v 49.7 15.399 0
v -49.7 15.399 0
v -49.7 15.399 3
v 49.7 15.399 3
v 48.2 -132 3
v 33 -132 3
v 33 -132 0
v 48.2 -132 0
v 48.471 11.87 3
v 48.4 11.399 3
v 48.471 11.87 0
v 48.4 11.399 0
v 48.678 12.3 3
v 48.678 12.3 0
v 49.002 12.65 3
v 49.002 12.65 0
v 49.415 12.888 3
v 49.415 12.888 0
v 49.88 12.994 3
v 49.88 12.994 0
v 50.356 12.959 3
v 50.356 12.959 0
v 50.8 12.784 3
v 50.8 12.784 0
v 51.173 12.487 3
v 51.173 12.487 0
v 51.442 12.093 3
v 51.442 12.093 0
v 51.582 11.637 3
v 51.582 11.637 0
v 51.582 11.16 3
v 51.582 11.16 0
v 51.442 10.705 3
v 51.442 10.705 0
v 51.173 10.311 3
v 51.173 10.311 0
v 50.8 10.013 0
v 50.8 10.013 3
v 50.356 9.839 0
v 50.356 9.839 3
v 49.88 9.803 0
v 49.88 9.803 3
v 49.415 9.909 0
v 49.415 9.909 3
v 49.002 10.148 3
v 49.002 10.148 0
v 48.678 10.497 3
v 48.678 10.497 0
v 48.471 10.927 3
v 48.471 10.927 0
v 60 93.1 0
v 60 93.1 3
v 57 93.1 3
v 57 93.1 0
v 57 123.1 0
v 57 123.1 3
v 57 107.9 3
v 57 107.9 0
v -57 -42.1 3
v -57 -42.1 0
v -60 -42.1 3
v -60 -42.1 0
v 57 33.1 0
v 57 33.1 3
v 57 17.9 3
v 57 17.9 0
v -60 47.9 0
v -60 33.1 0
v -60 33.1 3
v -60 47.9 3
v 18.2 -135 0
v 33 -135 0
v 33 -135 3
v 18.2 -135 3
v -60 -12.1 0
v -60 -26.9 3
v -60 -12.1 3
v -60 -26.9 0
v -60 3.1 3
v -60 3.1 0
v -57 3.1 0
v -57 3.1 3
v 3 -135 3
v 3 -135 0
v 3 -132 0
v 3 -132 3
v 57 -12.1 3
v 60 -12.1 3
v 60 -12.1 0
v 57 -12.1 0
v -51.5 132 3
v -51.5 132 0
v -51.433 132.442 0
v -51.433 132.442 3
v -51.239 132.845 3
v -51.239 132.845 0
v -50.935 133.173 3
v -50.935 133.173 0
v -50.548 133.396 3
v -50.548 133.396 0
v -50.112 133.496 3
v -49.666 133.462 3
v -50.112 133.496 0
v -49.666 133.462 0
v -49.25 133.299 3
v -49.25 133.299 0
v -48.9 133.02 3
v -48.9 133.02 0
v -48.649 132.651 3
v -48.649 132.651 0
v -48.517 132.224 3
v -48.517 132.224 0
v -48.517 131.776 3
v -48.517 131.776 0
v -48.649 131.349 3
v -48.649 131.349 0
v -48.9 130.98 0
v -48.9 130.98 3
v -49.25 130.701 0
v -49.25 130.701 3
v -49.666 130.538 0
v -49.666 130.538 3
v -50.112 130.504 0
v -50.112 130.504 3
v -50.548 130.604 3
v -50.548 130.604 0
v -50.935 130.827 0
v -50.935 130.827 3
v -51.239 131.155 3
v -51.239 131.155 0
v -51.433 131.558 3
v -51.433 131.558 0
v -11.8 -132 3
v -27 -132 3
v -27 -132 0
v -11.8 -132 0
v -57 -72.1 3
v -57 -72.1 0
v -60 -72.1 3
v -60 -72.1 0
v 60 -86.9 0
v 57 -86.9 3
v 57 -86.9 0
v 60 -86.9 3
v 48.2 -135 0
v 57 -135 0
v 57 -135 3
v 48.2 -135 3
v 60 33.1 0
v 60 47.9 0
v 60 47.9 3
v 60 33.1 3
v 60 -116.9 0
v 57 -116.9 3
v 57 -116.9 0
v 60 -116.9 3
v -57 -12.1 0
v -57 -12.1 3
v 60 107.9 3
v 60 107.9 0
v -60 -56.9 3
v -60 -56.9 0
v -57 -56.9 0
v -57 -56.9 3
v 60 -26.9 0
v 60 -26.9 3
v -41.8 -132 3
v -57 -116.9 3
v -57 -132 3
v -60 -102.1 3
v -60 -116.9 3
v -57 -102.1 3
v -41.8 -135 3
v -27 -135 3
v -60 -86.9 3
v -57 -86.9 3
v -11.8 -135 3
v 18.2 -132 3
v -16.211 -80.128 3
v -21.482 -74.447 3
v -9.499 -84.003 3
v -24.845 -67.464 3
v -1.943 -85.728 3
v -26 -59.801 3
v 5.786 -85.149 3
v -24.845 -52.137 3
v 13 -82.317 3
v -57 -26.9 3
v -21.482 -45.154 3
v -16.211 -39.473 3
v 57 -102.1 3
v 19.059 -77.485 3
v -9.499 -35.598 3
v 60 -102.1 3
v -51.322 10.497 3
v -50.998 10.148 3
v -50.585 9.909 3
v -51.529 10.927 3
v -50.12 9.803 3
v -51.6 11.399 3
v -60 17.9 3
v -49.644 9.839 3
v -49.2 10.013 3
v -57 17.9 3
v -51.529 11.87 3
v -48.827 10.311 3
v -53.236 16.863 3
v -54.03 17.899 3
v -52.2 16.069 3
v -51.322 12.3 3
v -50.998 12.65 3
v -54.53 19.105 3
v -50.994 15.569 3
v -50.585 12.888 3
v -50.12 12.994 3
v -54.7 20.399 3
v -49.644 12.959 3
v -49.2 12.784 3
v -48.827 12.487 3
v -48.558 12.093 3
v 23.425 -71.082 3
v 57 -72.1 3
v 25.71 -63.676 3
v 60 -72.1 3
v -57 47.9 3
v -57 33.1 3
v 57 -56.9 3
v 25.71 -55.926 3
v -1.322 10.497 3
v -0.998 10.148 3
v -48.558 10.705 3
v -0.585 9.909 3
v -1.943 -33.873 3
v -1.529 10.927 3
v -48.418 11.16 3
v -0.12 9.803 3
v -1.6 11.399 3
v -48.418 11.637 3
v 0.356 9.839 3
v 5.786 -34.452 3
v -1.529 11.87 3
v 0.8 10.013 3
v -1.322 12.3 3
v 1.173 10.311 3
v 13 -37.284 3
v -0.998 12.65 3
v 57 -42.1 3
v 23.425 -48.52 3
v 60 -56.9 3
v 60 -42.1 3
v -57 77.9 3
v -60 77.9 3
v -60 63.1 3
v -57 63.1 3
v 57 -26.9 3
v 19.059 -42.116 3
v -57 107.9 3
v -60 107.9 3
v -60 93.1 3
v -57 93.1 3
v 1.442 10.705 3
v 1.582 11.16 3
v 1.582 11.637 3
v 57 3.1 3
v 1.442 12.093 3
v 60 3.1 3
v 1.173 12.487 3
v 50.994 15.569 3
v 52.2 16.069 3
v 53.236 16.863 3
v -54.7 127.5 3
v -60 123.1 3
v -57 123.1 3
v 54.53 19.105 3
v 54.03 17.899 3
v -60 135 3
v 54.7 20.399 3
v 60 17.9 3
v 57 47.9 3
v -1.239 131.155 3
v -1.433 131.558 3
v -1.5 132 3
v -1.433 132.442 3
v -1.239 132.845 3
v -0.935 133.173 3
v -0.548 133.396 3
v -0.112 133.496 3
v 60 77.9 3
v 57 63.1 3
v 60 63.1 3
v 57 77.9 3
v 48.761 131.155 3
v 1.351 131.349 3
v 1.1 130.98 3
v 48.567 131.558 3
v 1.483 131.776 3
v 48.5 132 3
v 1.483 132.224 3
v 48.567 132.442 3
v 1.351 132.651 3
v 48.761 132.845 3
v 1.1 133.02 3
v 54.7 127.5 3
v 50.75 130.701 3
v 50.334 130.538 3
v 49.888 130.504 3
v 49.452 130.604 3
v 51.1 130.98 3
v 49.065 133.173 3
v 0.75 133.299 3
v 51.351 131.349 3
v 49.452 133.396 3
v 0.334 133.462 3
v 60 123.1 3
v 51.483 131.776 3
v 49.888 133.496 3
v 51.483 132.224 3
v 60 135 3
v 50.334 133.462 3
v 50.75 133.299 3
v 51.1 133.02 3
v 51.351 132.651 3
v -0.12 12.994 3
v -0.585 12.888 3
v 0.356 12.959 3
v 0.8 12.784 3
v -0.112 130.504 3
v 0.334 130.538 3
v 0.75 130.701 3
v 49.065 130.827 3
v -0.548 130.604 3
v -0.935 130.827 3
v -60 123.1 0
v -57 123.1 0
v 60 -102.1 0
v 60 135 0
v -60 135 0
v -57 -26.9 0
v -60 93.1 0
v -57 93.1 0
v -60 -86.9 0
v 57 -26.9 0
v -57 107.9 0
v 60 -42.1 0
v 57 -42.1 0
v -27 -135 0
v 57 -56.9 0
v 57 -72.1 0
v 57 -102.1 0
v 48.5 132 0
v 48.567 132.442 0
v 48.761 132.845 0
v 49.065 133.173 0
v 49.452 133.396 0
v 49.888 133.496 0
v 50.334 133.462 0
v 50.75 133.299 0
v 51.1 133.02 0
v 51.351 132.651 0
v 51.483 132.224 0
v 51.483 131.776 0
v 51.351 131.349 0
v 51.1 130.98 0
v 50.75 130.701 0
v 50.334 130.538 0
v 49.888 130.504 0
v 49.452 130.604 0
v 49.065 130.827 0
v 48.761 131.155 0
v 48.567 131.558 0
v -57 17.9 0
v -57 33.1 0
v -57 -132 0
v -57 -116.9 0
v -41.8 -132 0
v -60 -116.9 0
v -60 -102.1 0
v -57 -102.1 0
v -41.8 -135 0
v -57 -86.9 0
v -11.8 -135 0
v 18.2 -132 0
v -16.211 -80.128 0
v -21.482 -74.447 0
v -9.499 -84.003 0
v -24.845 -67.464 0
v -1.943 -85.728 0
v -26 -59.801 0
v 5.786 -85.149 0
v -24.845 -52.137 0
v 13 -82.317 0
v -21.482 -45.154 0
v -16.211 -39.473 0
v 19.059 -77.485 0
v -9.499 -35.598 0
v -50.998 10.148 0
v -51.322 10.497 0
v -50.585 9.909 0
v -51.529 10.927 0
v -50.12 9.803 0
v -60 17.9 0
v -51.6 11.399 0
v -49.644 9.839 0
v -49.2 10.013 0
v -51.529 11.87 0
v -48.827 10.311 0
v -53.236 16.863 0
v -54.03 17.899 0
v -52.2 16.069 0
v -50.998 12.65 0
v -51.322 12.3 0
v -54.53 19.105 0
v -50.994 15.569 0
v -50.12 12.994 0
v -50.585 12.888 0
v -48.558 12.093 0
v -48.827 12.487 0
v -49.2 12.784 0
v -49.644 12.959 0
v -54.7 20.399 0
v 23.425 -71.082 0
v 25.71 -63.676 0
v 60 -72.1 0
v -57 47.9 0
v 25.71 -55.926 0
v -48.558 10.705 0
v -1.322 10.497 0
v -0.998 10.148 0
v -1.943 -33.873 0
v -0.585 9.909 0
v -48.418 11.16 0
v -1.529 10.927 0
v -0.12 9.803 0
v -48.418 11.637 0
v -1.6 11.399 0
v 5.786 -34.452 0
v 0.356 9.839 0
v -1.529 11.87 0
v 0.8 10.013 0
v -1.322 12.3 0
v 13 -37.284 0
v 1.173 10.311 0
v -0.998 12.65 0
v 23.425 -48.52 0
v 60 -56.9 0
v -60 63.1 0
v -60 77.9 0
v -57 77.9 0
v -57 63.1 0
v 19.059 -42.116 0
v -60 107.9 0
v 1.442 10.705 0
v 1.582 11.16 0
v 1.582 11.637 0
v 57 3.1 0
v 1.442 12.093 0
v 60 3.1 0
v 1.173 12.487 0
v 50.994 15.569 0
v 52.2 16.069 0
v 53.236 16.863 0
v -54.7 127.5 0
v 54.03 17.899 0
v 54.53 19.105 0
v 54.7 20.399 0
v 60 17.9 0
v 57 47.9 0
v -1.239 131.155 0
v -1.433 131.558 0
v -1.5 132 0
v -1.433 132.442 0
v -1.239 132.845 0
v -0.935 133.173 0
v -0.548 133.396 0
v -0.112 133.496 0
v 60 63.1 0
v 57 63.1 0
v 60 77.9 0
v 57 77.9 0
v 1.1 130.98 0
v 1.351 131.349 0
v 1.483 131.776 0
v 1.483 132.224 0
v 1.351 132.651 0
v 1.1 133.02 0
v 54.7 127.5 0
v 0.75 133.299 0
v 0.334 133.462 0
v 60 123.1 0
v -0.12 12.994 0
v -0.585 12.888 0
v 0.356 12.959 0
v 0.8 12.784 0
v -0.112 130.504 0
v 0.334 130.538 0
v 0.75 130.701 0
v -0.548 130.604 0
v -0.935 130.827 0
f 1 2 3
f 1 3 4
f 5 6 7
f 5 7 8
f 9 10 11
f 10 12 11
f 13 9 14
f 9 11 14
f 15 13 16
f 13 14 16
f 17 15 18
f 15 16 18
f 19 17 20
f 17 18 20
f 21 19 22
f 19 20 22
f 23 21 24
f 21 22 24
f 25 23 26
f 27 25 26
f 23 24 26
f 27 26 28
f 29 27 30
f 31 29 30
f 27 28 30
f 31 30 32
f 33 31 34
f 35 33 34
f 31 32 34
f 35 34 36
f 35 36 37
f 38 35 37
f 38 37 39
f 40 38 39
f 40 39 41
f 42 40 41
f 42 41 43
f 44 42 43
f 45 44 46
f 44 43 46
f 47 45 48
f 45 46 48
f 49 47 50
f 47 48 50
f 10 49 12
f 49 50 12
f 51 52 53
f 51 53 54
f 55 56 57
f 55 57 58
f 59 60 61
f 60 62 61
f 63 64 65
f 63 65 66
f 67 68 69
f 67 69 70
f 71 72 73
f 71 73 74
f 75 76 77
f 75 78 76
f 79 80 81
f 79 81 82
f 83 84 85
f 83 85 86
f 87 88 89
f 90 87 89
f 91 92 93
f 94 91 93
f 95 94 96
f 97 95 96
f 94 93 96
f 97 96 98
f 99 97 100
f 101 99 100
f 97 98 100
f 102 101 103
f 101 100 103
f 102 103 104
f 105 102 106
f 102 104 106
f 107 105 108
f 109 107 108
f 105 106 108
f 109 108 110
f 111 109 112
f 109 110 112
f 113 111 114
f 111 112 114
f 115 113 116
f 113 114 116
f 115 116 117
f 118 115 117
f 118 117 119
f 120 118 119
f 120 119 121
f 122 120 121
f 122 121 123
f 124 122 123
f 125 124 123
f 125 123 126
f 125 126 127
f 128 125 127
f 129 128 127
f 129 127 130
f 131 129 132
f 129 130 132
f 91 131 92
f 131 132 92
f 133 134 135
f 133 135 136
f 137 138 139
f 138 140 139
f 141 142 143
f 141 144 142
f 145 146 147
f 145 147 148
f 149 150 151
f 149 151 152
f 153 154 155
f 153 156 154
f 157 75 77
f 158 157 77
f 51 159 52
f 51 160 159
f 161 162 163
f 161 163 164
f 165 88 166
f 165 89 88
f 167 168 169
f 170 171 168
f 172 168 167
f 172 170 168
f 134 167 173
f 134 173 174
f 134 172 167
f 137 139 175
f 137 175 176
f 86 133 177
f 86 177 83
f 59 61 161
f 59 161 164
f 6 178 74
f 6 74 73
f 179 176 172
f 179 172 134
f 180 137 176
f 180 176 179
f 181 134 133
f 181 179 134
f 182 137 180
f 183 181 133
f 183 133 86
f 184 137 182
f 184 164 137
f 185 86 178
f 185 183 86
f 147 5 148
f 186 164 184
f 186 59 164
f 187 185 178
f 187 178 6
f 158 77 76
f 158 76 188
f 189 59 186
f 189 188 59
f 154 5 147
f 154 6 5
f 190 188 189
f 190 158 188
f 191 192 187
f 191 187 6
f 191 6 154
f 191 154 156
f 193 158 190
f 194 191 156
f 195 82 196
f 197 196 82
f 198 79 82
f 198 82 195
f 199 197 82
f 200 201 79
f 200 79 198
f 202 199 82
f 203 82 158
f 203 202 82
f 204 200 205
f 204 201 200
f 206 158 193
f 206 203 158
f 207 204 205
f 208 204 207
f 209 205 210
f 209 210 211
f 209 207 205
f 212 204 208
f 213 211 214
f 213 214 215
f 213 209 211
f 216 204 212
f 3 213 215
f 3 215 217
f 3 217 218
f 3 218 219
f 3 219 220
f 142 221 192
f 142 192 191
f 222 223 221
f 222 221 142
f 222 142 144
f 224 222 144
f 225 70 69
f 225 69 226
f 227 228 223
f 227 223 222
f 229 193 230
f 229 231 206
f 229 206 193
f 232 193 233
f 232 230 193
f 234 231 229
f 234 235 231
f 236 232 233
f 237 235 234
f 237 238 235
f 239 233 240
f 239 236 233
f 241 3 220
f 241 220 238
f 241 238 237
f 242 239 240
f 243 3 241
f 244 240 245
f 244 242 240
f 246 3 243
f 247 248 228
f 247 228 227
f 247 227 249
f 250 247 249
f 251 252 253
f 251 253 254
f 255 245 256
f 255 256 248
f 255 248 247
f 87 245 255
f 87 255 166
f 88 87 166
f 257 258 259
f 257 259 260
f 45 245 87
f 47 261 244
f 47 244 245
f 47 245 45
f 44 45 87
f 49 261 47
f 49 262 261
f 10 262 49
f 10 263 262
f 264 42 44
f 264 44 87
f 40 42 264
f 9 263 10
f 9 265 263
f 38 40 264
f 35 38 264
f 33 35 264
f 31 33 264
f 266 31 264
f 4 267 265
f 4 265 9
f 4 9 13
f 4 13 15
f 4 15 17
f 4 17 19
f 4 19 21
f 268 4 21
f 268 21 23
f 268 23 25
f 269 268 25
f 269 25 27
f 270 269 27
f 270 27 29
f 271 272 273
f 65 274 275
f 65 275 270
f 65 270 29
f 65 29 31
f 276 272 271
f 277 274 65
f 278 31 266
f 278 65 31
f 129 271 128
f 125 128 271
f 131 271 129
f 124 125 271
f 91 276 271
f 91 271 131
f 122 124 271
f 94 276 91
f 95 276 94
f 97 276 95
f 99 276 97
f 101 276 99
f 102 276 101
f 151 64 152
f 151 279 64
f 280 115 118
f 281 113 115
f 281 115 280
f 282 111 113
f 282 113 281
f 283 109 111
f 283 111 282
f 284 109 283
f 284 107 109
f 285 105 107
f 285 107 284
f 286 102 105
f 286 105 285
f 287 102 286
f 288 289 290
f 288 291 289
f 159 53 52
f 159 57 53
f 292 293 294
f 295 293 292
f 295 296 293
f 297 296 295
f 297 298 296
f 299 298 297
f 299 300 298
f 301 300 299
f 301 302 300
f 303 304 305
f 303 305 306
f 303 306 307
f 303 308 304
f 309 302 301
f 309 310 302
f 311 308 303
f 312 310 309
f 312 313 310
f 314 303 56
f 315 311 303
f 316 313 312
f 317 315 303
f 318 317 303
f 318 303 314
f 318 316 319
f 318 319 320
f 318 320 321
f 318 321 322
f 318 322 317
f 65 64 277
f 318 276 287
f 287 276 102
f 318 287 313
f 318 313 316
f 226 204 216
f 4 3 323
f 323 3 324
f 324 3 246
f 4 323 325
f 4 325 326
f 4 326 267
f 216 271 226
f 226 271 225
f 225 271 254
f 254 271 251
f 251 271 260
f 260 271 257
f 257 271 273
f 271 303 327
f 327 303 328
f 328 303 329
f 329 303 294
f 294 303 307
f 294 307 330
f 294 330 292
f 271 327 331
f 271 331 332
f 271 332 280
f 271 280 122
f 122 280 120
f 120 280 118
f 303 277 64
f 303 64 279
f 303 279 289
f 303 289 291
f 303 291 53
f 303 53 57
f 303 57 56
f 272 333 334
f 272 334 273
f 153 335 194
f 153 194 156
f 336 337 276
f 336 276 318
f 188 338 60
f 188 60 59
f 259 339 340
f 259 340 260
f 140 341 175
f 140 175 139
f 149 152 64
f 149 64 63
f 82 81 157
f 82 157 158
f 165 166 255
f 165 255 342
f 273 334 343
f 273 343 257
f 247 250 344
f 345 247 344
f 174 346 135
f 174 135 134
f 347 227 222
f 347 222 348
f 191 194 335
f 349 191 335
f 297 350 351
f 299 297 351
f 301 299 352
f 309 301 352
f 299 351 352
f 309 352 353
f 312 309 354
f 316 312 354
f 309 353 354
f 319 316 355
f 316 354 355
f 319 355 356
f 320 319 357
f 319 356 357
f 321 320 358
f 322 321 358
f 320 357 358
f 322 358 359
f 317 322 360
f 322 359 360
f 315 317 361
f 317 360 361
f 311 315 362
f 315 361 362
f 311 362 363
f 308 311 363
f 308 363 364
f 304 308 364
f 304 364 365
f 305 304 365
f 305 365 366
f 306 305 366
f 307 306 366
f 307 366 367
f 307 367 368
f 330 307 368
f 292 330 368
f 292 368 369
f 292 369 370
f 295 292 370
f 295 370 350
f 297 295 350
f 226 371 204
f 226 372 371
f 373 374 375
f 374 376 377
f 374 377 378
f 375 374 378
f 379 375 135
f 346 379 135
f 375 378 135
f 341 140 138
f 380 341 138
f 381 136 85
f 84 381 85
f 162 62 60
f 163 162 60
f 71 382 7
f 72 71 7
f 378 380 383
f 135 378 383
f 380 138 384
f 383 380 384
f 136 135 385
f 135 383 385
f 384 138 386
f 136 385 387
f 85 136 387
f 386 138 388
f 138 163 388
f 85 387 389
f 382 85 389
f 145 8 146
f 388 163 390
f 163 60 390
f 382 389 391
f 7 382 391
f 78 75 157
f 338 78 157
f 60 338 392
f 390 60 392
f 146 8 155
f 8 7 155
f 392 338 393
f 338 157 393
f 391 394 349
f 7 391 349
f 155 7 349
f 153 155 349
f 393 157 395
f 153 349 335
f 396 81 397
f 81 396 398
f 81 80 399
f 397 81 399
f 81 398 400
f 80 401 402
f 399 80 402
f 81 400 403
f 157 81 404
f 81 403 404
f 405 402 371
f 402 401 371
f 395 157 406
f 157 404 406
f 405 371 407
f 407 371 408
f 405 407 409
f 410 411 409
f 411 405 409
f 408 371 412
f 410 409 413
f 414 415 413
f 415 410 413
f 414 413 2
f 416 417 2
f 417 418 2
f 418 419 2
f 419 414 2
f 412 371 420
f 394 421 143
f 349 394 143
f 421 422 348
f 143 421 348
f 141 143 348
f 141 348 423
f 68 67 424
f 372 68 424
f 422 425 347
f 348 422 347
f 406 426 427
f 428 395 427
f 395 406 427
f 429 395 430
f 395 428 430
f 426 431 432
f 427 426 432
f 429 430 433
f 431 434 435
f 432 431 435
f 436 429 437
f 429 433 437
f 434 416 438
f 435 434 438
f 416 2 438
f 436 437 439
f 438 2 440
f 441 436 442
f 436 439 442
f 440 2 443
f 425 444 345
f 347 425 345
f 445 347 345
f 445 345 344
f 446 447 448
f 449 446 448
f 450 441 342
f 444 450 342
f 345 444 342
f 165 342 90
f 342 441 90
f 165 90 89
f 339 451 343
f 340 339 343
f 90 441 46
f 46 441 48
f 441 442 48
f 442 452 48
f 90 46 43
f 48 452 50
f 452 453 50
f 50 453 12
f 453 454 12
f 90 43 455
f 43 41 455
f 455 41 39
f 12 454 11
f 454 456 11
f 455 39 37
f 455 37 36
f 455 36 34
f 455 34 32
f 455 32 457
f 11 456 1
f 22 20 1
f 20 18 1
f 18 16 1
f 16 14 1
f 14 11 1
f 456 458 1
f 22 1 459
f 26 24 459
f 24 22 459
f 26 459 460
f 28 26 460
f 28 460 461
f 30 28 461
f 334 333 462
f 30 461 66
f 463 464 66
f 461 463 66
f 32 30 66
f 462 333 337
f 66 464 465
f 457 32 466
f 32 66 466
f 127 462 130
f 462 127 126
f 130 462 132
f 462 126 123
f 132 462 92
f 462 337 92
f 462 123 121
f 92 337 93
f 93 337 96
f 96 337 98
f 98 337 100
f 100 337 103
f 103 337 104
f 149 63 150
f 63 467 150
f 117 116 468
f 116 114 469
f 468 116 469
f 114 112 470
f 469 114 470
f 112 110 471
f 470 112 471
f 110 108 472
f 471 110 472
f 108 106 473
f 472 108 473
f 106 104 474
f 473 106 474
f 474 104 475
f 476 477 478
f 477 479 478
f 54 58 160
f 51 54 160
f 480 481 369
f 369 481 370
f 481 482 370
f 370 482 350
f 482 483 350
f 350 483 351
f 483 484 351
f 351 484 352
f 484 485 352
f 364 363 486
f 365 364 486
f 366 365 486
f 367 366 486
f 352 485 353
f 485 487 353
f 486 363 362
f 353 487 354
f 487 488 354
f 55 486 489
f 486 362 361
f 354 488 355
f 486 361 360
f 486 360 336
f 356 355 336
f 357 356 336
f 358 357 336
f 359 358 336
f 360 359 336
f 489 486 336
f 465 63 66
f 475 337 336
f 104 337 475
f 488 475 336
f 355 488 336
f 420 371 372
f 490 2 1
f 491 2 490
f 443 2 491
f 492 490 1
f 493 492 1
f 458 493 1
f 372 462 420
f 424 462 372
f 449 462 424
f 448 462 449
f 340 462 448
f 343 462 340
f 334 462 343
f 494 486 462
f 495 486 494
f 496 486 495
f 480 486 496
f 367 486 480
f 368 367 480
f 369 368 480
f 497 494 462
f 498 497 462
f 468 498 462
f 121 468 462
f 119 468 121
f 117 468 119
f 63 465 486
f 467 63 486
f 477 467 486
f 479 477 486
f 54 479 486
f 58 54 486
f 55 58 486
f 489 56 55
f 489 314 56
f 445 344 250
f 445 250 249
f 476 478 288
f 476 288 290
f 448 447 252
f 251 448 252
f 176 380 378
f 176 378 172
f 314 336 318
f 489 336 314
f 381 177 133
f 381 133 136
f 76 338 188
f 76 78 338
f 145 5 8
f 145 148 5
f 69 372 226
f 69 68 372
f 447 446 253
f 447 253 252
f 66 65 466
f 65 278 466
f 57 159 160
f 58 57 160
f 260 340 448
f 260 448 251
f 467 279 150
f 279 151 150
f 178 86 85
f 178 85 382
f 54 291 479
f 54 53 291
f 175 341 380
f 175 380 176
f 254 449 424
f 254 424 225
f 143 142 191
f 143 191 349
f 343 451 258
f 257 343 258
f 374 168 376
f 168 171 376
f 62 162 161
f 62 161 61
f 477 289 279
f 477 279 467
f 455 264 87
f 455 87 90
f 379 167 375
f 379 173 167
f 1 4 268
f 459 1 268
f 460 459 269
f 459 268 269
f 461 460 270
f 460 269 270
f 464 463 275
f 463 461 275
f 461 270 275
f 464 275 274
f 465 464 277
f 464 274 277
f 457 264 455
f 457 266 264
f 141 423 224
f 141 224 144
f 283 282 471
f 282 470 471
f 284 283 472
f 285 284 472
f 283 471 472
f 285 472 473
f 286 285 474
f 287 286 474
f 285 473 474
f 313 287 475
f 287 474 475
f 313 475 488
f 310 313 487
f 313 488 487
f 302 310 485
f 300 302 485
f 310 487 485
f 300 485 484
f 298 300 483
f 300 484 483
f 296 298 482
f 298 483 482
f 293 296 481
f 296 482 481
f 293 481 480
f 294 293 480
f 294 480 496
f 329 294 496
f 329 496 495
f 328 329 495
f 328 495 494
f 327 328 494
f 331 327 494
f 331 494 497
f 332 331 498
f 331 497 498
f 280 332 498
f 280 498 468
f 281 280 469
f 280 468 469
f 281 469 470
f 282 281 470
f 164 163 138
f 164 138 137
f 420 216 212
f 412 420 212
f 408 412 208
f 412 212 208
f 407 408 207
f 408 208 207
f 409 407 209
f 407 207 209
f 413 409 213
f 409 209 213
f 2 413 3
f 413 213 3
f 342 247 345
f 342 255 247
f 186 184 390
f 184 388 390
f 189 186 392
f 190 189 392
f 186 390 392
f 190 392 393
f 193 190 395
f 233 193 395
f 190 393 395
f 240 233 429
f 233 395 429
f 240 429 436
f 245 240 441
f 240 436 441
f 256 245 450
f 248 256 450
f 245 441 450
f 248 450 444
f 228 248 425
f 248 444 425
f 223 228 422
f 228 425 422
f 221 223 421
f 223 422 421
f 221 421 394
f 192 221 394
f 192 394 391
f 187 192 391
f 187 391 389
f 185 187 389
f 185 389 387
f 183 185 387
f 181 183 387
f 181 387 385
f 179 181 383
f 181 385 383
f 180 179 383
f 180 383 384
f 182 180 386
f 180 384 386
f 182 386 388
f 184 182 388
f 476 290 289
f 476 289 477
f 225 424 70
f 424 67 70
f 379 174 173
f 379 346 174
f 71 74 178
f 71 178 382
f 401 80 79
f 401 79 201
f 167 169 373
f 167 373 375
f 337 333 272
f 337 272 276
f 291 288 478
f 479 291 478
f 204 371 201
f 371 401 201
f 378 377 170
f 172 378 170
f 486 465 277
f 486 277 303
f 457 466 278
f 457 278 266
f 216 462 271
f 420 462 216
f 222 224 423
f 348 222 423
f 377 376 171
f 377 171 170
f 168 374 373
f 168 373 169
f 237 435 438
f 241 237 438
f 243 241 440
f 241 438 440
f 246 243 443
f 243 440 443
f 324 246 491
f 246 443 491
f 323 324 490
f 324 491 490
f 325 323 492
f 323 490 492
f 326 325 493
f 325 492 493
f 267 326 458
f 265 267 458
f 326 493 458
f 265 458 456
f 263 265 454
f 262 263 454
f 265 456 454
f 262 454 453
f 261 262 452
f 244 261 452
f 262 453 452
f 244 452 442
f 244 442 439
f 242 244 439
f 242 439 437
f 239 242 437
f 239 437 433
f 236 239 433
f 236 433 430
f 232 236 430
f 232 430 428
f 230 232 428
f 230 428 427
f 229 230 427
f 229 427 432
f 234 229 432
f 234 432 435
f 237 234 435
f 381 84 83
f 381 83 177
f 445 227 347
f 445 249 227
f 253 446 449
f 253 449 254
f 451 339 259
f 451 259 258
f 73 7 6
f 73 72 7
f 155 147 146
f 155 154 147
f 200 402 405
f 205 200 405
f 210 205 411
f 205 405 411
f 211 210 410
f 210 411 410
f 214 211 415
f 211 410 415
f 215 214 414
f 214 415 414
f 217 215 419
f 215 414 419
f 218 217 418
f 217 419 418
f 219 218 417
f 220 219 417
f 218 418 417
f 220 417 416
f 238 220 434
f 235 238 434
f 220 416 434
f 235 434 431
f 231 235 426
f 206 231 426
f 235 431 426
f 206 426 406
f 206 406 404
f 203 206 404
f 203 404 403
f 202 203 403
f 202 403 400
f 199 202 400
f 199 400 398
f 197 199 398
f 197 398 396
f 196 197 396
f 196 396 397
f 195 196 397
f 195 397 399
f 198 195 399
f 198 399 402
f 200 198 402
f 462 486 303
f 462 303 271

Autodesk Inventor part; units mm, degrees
ref_plane "YZ Plane" through (0, 0, 0) normal (1, 0, 0) x (0, 1, 0)
ref_plane "XZ Plane" through (0, 0, 0) normal (0, 1, 0) x (-1, 0, 0)
ref_plane "XY Plane" through (0, 0, 0) normal (0, 0, 1) x (1, 0, 0)
sketch "Esboço1" plane through (0, 0, 0) normal (0, 0, 1) x (1, 0, 0)
  line L0 (60, -135) -> (-60, -135)
  line L1 (-60, -135) -> (-60, 135)
  line L2 (-60, 135) -> (60, 135)
  line L3 (60, 135) -> (60, -135)
  line L4 (60, -135) -> (-60, 135) construction
  line L5 (-60, -135) -> (60, 135) construction
  point P0 (0, 0)
  dimension "d0" = 120
  dimension "d1" = 270
extrude "Extrusão1" add sketch "Esboço1" along normal blind 3
sketch "Esboço3" plane through (60, -135, 0) normal (1, 0, 0) x (0, 0, -1)
  line L0 (0, 0) -> (-3, 0) projected
  line L1 (0, 0) -> (-3, 0)
  line L2 (-3, 0) -> (-3, 18.1)
  line L3 (-3, 18.1) -> (0, 18.1)
  line L4 (0, 18.1) -> (0, 0)
  line L5 (-3, 2.9) -> (0, 2.9)
  line L6 (-3, 48.1) -> (0, 48.1)
  line L7 (-3, 32.9) -> (0, 32.9)
  line L8 (-3, 78.1) -> (0, 78.1)
  line L9 (-3, 62.9) -> (0, 62.9)
  line L10 (-3, 108.1) -> (0, 108.1)
  line L11 (-3, 92.9) -> (0, 92.9)
  line L12 (-3, 138.1) -> (0, 138.1)
  line L13 (-3, 122.9) -> (0, 122.9)
  line L14 (-3, 168.1) -> (0, 168.1)
  line L15 (-3, 152.9) -> (0, 152.9)
  line L16 (-3, 198.1) -> (0, 198.1)
  line L17 (-3, 182.9) -> (0, 182.9)
  line L18 (-3, 228.1) -> (0, 228.1)
  line L19 (-3, 212.9) -> (0, 212.9)
  line L20 (-3, 258.1) -> (0, 258.1)
  line L21 (-3, 242.9) -> (0, 242.9)
  line L22 (-3, 288.1) -> (0, 288.1)
  line L23 (-3, 272.9) -> (0, 272.9)
  line L24 (-3, 0) -> (-3, 270) projected
  line L25 (0, 0) -> (0, 270) projected
  point P0 (0, 135)
  dimension "d13" = 18.1
  dimension "d14" = 3
  dimension "d38" = 2.9
  dimension "d41" = 30
extrude "Extrusão2" cut sketch "Esboço3" against normal blind 3 contours L0 L2 L5 L4 | L5 L2 L3 L4 | L7 L24 L6 L25 | L9 L24 L8 L25 | L11 L24 L10 L25 | L13 L24 L12 L25 | L15 L24 L14 L25 | L17 L24 L16 L25 | L19 L24 L18 L25 | L21 L24 L20 L25
sketch "Esboço5" plane through (57, -135, 0) normal (0, -1, 0) x (1, 0, 0)
  line L0 (-117, 0) -> (0, 0) projected
  line L1 (-114, 3) -> (-98.8, 3)
  line L2 (-98.8, 3) -> (-98.8, 0)
  line L3 (-98.8, 0) -> (-114, 0)
  line L4 (-114, 0) -> (-114, 3)
  line L5 (-84, 3) -> (-68.8, 3)
  line L6 (-68.8, 3) -> (-68.8, 0)
  line L7 (-68.8, 0) -> (-84, 0)
  line L8 (-84, 0) -> (-84, 3)
  line L9 (-54, 3) -> (-38.8, 3)
  line L10 (-38.8, 3) -> (-38.8, 0)
  line L11 (-38.8, 0) -> (-54, 0)
  line L12 (-54, 0) -> (-54, 3)
  line L13 (-24, 3) -> (-8.8, 3)
  line L14 (-8.8, 3) -> (-8.8, 0)
  line L15 (-8.8, 0) -> (-24, 0)
  line L16 (-24, 0) -> (-24, 3)
  line L17 (-117, 0) -> (-117, 3) projected
  point P0 (-57, 0)
  point P1 (-24, 0)
  point P2 (-54, 0)
  point P3 (-84, 0)
  point P4 (-117, 1.5)
  point P5 (-114, 1.5)
  dimension "d26" = 15.2
  dimension "d29" = 30
  dimension "d56" = 3
extrude "Extrusão4" cut sketch "Esboço5" against normal blind 3
sketch "Esboço7" plane through (-60, -135, 0) normal (-1, 0, 0) x (0, 0, 1)
  line L0 (3, 18.1) -> (0, 18.1) projected
  line L1 (3, 0) -> (3, 18.1) projected
  line L2 (0, 18.1) -> (0, 0) projected
  line L3 (0, 32.9) -> (3, 32.9) projected
  line L4 (3, 270) -> (3, 0) projected
  line L5 (0, 270) -> (0, 0) projected
  line L6 (0, 32.9) -> (3, 32.9)
  line L7 (0, 18.1) -> (3, 18.1)
  line L8 (0, 48.1) -> (3, 48.1)
  line L9 (0, 62.9) -> (3, 62.9)
  line L10 (0, 78.1) -> (3, 78.1)
  line L11 (0, 92.9) -> (3, 92.9)
  line L12 (0, 108.1) -> (3, 108.1)
  line L13 (0, 122.9) -> (3, 122.9)
  line L14 (0, 138.1) -> (3, 138.1)
  line L15 (0, 152.9) -> (3, 152.9)
  line L16 (0, 168.1) -> (3, 168.1)
  line L17 (0, 182.9) -> (3, 182.9)
  line L18 (0, 198.1) -> (3, 198.1)
  line L19 (0, 212.9) -> (3, 212.9)
  line L20 (0, 228.1) -> (3, 228.1)
  line L21 (0, 242.9) -> (3, 242.9)
  line L22 (0, 258.1) -> (3, 258.1)
  line L23 (0, 272.9) -> (3, 272.9)
  line L24 (0, 288.1) -> (3, 288.1)
  line L25 (0, 302.9) -> (3, 302.9)
  line L26 (3, 0) -> (0, 0) projected
  line L27 (0, 0) -> (0, 270) projected
  line L28 (0, 270) -> (3, 270) projected
  line L29 (3, 270) -> (3, 0) projected
  point P0 (0, 135)
  point P1 (3, 258.1)
  point P2 (0, 258.1)
  point P3 (0, 242.9)
  point P4 (3, 242.9)
  point P5 (3, 228.1)
  point P6 (0, 228.1)
  point P7 (0, 212.9)
  point P8 (3, 212.9)
  point P9 (3, 198.1)
  point P10 (0, 198.1)
  point P11 (0, 182.9)
  point P12 (3, 182.9)
  point P13 (3, 168.1)
  point P14 (0, 168.1)
  point P15 (0, 152.9)
  point P16 (3, 152.9)
  point P17 (3, 138.1)
  point P18 (0, 138.1)
  point P19 (0, 122.9)
  point P20 (3, 122.9)
  point P21 (3, 108.1)
  point P22 (0, 108.1)
  point P23 (0, 92.9)
  point P24 (3, 92.9)
  point P25 (3, 78.1)
  point P26 (0, 78.1)
  point P27 (0, 62.9)
  point P28 (3, 62.9)
  point P29 (3, 48.1)
  point P30 (0, 48.1)
  dimension "d49" = 30
extrude "Extrusão5" cut sketch "Esboço7" against normal blind 3 contours L1 L26 L2 L0 | L3 L5 L8 L4 | L9 L5 L10 L4 | L11 L5 L12 L4 | L13 L5 L14 L4 | L15 L5 L16 L4 | L17 L5 L18 L4 | L19 L5 L20 L4 | L21 L5 L22 L4
sketch "Esboço8" plane through (0, 0, 0) normal (0, 0, -1) x (-1, 0, 0)
  line L0 (-57, -86.9) -> (-60, -86.9) construction
  line L1 (-60, -86.9) -> (-60, -72.1) construction
  line L2 (-60, -72.1) -> (-57, -72.1) construction
  line L3 (-57, -72.1) -> (-57, -56.9) construction
  line L4 (-57, -56.9) -> (-60, -56.9) construction
  line L5 (-60, -56.9) -> (-60, -42.1) construction
  line L6 (-60, -42.1) -> (-57, -42.1) construction
  line L7 (-57, -42.1) -> (-57, -26.9) construction
  line L8 (-57, -26.9) -> (-60, -26.9) construction
  line L9 (-60, -26.9) -> (-60, -12.1) construction
  line L10 (-60, -12.1) -> (-57, -12.1) construction
  line L11 (-57, -12.1) -> (-57, 3.1) construction
  line L12 (-57, 3.1) -> (-60, 3.1) construction
  line L13 (-60, 3.1) -> (-60, 17.9) construction
  line L14 (-60, 17.9) -> (-57, 17.9) construction
  line L15 (-57, 17.9) -> (-57, 33.1) construction
  line L16 (-57, 33.1) -> (-60, 33.1) construction
  line L17 (-60, 33.1) -> (-60, 47.9) construction
  line L18 (-60, 47.9) -> (-57, 47.9) construction
  line L19 (-57, 47.9) -> (-57, 63.1) construction
  line L20 (-57, 63.1) -> (-60, 63.1) construction
  line L21 (-60, 63.1) -> (-60, 77.9) construction
  line L22 (-60, 77.9) -> (-57, 77.9) construction
  line L23 (-57, 77.9) -> (-57, 93.1) construction
  line L24 (-57, 93.1) -> (-60, 93.1) construction
  line L25 (-60, 93.1) -> (-60, 107.9) construction
  line L26 (-60, 107.9) -> (-57, 107.9) construction
  line L27 (-57, 107.9) -> (-57, 123.1) construction
  line L28 (-57, 123.1) -> (-60, 123.1) construction
  line L29 (-60, 123.1) -> (-60, 135) construction
  line L30 (-60, 135) -> (60, 135) construction
  line L31 (60, 135) -> (60, 123.1) construction
  line L32 (60, 123.1) -> (57, 123.1) construction
  line L33 (57, 123.1) -> (57, 107.9) construction
  line L34 (57, 107.9) -> (60, 107.9) construction
  line L35 (60, 107.9) -> (60, 93.1) construction
  line L36 (60, 93.1) -> (57, 93.1) construction
  line L37 (57, 93.1) -> (57, 77.9) construction
  line L38 (57, 77.9) -> (60, 77.9) construction
  line L39 (60, 77.9) -> (60, 63.1) construction
  line L40 (60, 63.1) -> (57, 63.1) construction
  line L41 (57, 63.1) -> (57, 47.9) construction
  line L42 (57, 47.9) -> (60, 47.9) construction
  line L43 (60, 47.9) -> (60, 33.1) construction
  line L44 (60, 33.1) -> (57, 33.1) construction
  line L45 (57, 33.1) -> (57, 17.9) construction
  line L46 (57, 17.9) -> (60, 17.9) construction
  line L47 (60, 17.9) -> (60, 3.1) construction
  line L48 (60, 3.1) -> (57, 3.1) construction
  line L49 (57, 3.1) -> (57, -12.1) construction
  line L50 (57, -12.1) -> (60, -12.1) construction
  line L51 (60, -12.1) -> (60, -26.9) construction
  line L52 (60, -26.9) -> (57, -26.9) construction
  line L53 (57, -26.9) -> (57, -42.1) construction
  line L54 (57, -42.1) -> (60, -42.1) construction
  line L55 (60, -42.1) -> (60, -56.9) construction
  line L56 (60, -56.9) -> (57, -56.9) construction
  line L57 (57, -56.9) -> (57, -72.1) construction
  line L58 (57, -72.1) -> (60, -72.1) construction
  line L59 (60, -72.1) -> (60, -86.9) construction
  line L60 (60, -86.9) -> (57, -86.9) construction
  line L61 (57, -86.9) -> (57, -102.1) construction
  line L62 (57, -102.1) -> (60, -102.1) construction
  line L63 (60, -102.1) -> (60, -116.9) construction
  line L64 (60, -116.9) -> (57, -116.9) construction
  line L65 (57, -116.9) -> (57, -132) construction
  line L66 (57, -132) -> (41.8, -132) construction
  line L67 (41.8, -132) -> (41.8, -135) construction
  line L68 (41.8, -135) -> (27, -135) construction
  line L69 (27, -135) -> (27, -132) construction
  line L70 (27, -132) -> (11.8, -132) construction
  line L71 (11.8, -132) -> (11.8, -135) construction
  line L72 (11.8, -135) -> (-3, -135) construction
  line L73 (-3, -135) -> (-3, -132) construction
  line L74 (-3, -132) -> (-18.2, -132) construction
  line L75 (-18.2, -132) -> (-18.2, -135) construction
  line L76 (-18.2, -135) -> (-33, -135) construction
  line L77 (-33, -135) -> (-33, -132) construction
  line L78 (-33, -132) -> (-48.2, -132) construction
  line L79 (-48.2, -132) -> (-48.2, -135) construction
  line L80 (-48.2, -135) -> (-57, -135) construction
  line L81 (-57, -135) -> (-57, -116.9) construction
  line L82 (-57, -116.9) -> (-60, -116.9) construction
  line L83 (-60, -116.9) -> (-60, -102.1) construction
  line L84 (-60, -102.1) -> (-57, -102.1) construction
  line L85 (-57, -102.1) -> (-57, -86.9) construction
  ellipse E0 centre (-55.4, 11.3042) end of major axis (-55.4, 8.4758) minor radius 2 (-57.4, 11.3042) -> (-57.1743, 9.9988) ccw
  line L86 (-57.1743, 9.9988) -> (59.4, 9.9988)
  line L87 (59.4, 127.5) -> (59.4, 9.9988)
  line L88 (-57.4, 127.5) -> (59.4, 127.5)
  line L89 (-57.4, 127.5) -> (-57.4, 11.3042)
  ellipse E1 centre (-56.5, 121.6939) end of major axis (-56.5, 127.5415) minor radius 2 (-54.5, 121.6939) -> (-55.7002, 127.0537) ccw
  line L90 (-55.7002, 127.0537) -> (55.7002, 127.0537)
  ellipse E2 centre (56.5, 121.6939) end of major axis (56.5, 127.5415) minor radius 2 (55.7002, 127.0537) -> (54.5, 121.6939) ccw
  line L91 (54.5, 121.6939) -> (54.5, 105.9054)
  line L92 (54.5, 105.9054) -> (49.5, 105.9054) construction
  line L93 (49.5, 105.9054) -> (49.5, 116.4119) construction
  line L94 (49.5, 116.4119) -> (-49.5, 116.4119) construction
  line L95 (-49.5, 116.4119) -> (-49.5, 105.9054) construction
  line L96 (-49.5, 105.9054) -> (-54.5, 105.9054) construction
  line L97 (-54.5, 105.9054) -> (-54.5, 121.6939)
  circle A0 centre (-50, 132) radius 1.5
  circle A1 centre (0, 132) radius 1.5
  circle A2 centre (50, 132) radius 1.5
  line L98 (60, 7.3988) -> (-60, 7.3988)
  line L99 (-60, 7.3988) -> (-60, 136)
  line L100 (-60, 136) -> (60, 136)
  line L101 (60, 136) -> (60, 7.3988)
  line L102 (-60, 7.3988) -> (60, 7.3988)
  line L103 (60, 7.3988) -> (60, 15.3988)
  line L104 (60, 15.3988) -> (-60, 15.3988)
  line L105 (-60, 15.3988) -> (-60, 7.3988)
  line L106 (-60, 11.3988) -> (60, 11.3988) construction
  circle A3 centre (0, 11.3988) radius 1.6
  circle A4 centre (-50, 11.3988) radius 1.6
  circle A5 centre (50, 11.3988) radius 1.6
  line L107 (54.5, 66.3189) -> (54.5, 124.5798)
  line L108 (-54.5, 124.5798) -> (-54.5, 66.3189)
  line L109 (-60, 136) -> (60, 136)
  line L110 (-60, 135) -> (60, 135) projected
  line L111 (-54.7, 15.3988) -> (-54.7, 127.5)
  line L112 (54.7, 127.5) -> (54.7, 15.3988)
  point P0 (-60, 49.3988)
  point P1 (54.7, 127.0537)
  point P2 (-54.7, 127.0537)
  point P3 (54.7, 124.2429)
  point P4 (-54.7, 124.2429)
  point P5 (-55.6594, 127)
  point P6 (55.6594, 127)
  point P7 (-49.2254, 9.9988)
  point P8 (-50.7746, 9.9988)
  point P9 (0.7746, 9.9988)
  point P10 (-0.7746, 9.9988)
  point P11 (50.7746, 9.9988)
  point P12 (49.2254, 9.9988)
  dimension "d91" = 8
  dimension "d92" = 3.2
  dimension "d93" = 3.2
  dimension "d94" = 3.2
  dimension "d95" = 1
  dimension "d96" = 0.2
  dimension "d97" = 0.2
  dimension "d101" = 7.5
extrude "Extrusão6" cut sketch "Esboço8" against normal up to surface (3 mm away) contours A4 L86 | L86 A4 | L111 L90 L112 L104 | L88 L112 L90 L111 | A3 L86 | L86 A3 | A5 L86 | L86 A5 | A0 | A1 | A2
fillet "Arredondamento1" radius 5 2 edges at (54.7, 15.3988, 1.5) (-54.7, 15.3988, 1.5)
sketch "Esboço9" plane through (0, 0, 0) normal (0, 0, -1) x (-1, 0, 0)
  circle A0 centre (0, -59.8006) radius 26
  line L0 (49.7, 15.3988) -> (-49.7, 15.3988) projected
  line L1 (0, 15.3988) -> (0, -135) construction
  line L2 (11.8, -135) -> (-3, -135) projected
  point P0 (0, 0)
  point P1 (0, -59.8006)
  dimension "d102" = 52
extrude "Extrusão7" cut sketch "Esboço9" against normal up to surface (3 mm away)
equation "\"d14\" = d4"
equation "\"d93\" = d92"
equation "\"d94\" = d92"
equation "\"d4\" = 3"
properties part number "frente"
